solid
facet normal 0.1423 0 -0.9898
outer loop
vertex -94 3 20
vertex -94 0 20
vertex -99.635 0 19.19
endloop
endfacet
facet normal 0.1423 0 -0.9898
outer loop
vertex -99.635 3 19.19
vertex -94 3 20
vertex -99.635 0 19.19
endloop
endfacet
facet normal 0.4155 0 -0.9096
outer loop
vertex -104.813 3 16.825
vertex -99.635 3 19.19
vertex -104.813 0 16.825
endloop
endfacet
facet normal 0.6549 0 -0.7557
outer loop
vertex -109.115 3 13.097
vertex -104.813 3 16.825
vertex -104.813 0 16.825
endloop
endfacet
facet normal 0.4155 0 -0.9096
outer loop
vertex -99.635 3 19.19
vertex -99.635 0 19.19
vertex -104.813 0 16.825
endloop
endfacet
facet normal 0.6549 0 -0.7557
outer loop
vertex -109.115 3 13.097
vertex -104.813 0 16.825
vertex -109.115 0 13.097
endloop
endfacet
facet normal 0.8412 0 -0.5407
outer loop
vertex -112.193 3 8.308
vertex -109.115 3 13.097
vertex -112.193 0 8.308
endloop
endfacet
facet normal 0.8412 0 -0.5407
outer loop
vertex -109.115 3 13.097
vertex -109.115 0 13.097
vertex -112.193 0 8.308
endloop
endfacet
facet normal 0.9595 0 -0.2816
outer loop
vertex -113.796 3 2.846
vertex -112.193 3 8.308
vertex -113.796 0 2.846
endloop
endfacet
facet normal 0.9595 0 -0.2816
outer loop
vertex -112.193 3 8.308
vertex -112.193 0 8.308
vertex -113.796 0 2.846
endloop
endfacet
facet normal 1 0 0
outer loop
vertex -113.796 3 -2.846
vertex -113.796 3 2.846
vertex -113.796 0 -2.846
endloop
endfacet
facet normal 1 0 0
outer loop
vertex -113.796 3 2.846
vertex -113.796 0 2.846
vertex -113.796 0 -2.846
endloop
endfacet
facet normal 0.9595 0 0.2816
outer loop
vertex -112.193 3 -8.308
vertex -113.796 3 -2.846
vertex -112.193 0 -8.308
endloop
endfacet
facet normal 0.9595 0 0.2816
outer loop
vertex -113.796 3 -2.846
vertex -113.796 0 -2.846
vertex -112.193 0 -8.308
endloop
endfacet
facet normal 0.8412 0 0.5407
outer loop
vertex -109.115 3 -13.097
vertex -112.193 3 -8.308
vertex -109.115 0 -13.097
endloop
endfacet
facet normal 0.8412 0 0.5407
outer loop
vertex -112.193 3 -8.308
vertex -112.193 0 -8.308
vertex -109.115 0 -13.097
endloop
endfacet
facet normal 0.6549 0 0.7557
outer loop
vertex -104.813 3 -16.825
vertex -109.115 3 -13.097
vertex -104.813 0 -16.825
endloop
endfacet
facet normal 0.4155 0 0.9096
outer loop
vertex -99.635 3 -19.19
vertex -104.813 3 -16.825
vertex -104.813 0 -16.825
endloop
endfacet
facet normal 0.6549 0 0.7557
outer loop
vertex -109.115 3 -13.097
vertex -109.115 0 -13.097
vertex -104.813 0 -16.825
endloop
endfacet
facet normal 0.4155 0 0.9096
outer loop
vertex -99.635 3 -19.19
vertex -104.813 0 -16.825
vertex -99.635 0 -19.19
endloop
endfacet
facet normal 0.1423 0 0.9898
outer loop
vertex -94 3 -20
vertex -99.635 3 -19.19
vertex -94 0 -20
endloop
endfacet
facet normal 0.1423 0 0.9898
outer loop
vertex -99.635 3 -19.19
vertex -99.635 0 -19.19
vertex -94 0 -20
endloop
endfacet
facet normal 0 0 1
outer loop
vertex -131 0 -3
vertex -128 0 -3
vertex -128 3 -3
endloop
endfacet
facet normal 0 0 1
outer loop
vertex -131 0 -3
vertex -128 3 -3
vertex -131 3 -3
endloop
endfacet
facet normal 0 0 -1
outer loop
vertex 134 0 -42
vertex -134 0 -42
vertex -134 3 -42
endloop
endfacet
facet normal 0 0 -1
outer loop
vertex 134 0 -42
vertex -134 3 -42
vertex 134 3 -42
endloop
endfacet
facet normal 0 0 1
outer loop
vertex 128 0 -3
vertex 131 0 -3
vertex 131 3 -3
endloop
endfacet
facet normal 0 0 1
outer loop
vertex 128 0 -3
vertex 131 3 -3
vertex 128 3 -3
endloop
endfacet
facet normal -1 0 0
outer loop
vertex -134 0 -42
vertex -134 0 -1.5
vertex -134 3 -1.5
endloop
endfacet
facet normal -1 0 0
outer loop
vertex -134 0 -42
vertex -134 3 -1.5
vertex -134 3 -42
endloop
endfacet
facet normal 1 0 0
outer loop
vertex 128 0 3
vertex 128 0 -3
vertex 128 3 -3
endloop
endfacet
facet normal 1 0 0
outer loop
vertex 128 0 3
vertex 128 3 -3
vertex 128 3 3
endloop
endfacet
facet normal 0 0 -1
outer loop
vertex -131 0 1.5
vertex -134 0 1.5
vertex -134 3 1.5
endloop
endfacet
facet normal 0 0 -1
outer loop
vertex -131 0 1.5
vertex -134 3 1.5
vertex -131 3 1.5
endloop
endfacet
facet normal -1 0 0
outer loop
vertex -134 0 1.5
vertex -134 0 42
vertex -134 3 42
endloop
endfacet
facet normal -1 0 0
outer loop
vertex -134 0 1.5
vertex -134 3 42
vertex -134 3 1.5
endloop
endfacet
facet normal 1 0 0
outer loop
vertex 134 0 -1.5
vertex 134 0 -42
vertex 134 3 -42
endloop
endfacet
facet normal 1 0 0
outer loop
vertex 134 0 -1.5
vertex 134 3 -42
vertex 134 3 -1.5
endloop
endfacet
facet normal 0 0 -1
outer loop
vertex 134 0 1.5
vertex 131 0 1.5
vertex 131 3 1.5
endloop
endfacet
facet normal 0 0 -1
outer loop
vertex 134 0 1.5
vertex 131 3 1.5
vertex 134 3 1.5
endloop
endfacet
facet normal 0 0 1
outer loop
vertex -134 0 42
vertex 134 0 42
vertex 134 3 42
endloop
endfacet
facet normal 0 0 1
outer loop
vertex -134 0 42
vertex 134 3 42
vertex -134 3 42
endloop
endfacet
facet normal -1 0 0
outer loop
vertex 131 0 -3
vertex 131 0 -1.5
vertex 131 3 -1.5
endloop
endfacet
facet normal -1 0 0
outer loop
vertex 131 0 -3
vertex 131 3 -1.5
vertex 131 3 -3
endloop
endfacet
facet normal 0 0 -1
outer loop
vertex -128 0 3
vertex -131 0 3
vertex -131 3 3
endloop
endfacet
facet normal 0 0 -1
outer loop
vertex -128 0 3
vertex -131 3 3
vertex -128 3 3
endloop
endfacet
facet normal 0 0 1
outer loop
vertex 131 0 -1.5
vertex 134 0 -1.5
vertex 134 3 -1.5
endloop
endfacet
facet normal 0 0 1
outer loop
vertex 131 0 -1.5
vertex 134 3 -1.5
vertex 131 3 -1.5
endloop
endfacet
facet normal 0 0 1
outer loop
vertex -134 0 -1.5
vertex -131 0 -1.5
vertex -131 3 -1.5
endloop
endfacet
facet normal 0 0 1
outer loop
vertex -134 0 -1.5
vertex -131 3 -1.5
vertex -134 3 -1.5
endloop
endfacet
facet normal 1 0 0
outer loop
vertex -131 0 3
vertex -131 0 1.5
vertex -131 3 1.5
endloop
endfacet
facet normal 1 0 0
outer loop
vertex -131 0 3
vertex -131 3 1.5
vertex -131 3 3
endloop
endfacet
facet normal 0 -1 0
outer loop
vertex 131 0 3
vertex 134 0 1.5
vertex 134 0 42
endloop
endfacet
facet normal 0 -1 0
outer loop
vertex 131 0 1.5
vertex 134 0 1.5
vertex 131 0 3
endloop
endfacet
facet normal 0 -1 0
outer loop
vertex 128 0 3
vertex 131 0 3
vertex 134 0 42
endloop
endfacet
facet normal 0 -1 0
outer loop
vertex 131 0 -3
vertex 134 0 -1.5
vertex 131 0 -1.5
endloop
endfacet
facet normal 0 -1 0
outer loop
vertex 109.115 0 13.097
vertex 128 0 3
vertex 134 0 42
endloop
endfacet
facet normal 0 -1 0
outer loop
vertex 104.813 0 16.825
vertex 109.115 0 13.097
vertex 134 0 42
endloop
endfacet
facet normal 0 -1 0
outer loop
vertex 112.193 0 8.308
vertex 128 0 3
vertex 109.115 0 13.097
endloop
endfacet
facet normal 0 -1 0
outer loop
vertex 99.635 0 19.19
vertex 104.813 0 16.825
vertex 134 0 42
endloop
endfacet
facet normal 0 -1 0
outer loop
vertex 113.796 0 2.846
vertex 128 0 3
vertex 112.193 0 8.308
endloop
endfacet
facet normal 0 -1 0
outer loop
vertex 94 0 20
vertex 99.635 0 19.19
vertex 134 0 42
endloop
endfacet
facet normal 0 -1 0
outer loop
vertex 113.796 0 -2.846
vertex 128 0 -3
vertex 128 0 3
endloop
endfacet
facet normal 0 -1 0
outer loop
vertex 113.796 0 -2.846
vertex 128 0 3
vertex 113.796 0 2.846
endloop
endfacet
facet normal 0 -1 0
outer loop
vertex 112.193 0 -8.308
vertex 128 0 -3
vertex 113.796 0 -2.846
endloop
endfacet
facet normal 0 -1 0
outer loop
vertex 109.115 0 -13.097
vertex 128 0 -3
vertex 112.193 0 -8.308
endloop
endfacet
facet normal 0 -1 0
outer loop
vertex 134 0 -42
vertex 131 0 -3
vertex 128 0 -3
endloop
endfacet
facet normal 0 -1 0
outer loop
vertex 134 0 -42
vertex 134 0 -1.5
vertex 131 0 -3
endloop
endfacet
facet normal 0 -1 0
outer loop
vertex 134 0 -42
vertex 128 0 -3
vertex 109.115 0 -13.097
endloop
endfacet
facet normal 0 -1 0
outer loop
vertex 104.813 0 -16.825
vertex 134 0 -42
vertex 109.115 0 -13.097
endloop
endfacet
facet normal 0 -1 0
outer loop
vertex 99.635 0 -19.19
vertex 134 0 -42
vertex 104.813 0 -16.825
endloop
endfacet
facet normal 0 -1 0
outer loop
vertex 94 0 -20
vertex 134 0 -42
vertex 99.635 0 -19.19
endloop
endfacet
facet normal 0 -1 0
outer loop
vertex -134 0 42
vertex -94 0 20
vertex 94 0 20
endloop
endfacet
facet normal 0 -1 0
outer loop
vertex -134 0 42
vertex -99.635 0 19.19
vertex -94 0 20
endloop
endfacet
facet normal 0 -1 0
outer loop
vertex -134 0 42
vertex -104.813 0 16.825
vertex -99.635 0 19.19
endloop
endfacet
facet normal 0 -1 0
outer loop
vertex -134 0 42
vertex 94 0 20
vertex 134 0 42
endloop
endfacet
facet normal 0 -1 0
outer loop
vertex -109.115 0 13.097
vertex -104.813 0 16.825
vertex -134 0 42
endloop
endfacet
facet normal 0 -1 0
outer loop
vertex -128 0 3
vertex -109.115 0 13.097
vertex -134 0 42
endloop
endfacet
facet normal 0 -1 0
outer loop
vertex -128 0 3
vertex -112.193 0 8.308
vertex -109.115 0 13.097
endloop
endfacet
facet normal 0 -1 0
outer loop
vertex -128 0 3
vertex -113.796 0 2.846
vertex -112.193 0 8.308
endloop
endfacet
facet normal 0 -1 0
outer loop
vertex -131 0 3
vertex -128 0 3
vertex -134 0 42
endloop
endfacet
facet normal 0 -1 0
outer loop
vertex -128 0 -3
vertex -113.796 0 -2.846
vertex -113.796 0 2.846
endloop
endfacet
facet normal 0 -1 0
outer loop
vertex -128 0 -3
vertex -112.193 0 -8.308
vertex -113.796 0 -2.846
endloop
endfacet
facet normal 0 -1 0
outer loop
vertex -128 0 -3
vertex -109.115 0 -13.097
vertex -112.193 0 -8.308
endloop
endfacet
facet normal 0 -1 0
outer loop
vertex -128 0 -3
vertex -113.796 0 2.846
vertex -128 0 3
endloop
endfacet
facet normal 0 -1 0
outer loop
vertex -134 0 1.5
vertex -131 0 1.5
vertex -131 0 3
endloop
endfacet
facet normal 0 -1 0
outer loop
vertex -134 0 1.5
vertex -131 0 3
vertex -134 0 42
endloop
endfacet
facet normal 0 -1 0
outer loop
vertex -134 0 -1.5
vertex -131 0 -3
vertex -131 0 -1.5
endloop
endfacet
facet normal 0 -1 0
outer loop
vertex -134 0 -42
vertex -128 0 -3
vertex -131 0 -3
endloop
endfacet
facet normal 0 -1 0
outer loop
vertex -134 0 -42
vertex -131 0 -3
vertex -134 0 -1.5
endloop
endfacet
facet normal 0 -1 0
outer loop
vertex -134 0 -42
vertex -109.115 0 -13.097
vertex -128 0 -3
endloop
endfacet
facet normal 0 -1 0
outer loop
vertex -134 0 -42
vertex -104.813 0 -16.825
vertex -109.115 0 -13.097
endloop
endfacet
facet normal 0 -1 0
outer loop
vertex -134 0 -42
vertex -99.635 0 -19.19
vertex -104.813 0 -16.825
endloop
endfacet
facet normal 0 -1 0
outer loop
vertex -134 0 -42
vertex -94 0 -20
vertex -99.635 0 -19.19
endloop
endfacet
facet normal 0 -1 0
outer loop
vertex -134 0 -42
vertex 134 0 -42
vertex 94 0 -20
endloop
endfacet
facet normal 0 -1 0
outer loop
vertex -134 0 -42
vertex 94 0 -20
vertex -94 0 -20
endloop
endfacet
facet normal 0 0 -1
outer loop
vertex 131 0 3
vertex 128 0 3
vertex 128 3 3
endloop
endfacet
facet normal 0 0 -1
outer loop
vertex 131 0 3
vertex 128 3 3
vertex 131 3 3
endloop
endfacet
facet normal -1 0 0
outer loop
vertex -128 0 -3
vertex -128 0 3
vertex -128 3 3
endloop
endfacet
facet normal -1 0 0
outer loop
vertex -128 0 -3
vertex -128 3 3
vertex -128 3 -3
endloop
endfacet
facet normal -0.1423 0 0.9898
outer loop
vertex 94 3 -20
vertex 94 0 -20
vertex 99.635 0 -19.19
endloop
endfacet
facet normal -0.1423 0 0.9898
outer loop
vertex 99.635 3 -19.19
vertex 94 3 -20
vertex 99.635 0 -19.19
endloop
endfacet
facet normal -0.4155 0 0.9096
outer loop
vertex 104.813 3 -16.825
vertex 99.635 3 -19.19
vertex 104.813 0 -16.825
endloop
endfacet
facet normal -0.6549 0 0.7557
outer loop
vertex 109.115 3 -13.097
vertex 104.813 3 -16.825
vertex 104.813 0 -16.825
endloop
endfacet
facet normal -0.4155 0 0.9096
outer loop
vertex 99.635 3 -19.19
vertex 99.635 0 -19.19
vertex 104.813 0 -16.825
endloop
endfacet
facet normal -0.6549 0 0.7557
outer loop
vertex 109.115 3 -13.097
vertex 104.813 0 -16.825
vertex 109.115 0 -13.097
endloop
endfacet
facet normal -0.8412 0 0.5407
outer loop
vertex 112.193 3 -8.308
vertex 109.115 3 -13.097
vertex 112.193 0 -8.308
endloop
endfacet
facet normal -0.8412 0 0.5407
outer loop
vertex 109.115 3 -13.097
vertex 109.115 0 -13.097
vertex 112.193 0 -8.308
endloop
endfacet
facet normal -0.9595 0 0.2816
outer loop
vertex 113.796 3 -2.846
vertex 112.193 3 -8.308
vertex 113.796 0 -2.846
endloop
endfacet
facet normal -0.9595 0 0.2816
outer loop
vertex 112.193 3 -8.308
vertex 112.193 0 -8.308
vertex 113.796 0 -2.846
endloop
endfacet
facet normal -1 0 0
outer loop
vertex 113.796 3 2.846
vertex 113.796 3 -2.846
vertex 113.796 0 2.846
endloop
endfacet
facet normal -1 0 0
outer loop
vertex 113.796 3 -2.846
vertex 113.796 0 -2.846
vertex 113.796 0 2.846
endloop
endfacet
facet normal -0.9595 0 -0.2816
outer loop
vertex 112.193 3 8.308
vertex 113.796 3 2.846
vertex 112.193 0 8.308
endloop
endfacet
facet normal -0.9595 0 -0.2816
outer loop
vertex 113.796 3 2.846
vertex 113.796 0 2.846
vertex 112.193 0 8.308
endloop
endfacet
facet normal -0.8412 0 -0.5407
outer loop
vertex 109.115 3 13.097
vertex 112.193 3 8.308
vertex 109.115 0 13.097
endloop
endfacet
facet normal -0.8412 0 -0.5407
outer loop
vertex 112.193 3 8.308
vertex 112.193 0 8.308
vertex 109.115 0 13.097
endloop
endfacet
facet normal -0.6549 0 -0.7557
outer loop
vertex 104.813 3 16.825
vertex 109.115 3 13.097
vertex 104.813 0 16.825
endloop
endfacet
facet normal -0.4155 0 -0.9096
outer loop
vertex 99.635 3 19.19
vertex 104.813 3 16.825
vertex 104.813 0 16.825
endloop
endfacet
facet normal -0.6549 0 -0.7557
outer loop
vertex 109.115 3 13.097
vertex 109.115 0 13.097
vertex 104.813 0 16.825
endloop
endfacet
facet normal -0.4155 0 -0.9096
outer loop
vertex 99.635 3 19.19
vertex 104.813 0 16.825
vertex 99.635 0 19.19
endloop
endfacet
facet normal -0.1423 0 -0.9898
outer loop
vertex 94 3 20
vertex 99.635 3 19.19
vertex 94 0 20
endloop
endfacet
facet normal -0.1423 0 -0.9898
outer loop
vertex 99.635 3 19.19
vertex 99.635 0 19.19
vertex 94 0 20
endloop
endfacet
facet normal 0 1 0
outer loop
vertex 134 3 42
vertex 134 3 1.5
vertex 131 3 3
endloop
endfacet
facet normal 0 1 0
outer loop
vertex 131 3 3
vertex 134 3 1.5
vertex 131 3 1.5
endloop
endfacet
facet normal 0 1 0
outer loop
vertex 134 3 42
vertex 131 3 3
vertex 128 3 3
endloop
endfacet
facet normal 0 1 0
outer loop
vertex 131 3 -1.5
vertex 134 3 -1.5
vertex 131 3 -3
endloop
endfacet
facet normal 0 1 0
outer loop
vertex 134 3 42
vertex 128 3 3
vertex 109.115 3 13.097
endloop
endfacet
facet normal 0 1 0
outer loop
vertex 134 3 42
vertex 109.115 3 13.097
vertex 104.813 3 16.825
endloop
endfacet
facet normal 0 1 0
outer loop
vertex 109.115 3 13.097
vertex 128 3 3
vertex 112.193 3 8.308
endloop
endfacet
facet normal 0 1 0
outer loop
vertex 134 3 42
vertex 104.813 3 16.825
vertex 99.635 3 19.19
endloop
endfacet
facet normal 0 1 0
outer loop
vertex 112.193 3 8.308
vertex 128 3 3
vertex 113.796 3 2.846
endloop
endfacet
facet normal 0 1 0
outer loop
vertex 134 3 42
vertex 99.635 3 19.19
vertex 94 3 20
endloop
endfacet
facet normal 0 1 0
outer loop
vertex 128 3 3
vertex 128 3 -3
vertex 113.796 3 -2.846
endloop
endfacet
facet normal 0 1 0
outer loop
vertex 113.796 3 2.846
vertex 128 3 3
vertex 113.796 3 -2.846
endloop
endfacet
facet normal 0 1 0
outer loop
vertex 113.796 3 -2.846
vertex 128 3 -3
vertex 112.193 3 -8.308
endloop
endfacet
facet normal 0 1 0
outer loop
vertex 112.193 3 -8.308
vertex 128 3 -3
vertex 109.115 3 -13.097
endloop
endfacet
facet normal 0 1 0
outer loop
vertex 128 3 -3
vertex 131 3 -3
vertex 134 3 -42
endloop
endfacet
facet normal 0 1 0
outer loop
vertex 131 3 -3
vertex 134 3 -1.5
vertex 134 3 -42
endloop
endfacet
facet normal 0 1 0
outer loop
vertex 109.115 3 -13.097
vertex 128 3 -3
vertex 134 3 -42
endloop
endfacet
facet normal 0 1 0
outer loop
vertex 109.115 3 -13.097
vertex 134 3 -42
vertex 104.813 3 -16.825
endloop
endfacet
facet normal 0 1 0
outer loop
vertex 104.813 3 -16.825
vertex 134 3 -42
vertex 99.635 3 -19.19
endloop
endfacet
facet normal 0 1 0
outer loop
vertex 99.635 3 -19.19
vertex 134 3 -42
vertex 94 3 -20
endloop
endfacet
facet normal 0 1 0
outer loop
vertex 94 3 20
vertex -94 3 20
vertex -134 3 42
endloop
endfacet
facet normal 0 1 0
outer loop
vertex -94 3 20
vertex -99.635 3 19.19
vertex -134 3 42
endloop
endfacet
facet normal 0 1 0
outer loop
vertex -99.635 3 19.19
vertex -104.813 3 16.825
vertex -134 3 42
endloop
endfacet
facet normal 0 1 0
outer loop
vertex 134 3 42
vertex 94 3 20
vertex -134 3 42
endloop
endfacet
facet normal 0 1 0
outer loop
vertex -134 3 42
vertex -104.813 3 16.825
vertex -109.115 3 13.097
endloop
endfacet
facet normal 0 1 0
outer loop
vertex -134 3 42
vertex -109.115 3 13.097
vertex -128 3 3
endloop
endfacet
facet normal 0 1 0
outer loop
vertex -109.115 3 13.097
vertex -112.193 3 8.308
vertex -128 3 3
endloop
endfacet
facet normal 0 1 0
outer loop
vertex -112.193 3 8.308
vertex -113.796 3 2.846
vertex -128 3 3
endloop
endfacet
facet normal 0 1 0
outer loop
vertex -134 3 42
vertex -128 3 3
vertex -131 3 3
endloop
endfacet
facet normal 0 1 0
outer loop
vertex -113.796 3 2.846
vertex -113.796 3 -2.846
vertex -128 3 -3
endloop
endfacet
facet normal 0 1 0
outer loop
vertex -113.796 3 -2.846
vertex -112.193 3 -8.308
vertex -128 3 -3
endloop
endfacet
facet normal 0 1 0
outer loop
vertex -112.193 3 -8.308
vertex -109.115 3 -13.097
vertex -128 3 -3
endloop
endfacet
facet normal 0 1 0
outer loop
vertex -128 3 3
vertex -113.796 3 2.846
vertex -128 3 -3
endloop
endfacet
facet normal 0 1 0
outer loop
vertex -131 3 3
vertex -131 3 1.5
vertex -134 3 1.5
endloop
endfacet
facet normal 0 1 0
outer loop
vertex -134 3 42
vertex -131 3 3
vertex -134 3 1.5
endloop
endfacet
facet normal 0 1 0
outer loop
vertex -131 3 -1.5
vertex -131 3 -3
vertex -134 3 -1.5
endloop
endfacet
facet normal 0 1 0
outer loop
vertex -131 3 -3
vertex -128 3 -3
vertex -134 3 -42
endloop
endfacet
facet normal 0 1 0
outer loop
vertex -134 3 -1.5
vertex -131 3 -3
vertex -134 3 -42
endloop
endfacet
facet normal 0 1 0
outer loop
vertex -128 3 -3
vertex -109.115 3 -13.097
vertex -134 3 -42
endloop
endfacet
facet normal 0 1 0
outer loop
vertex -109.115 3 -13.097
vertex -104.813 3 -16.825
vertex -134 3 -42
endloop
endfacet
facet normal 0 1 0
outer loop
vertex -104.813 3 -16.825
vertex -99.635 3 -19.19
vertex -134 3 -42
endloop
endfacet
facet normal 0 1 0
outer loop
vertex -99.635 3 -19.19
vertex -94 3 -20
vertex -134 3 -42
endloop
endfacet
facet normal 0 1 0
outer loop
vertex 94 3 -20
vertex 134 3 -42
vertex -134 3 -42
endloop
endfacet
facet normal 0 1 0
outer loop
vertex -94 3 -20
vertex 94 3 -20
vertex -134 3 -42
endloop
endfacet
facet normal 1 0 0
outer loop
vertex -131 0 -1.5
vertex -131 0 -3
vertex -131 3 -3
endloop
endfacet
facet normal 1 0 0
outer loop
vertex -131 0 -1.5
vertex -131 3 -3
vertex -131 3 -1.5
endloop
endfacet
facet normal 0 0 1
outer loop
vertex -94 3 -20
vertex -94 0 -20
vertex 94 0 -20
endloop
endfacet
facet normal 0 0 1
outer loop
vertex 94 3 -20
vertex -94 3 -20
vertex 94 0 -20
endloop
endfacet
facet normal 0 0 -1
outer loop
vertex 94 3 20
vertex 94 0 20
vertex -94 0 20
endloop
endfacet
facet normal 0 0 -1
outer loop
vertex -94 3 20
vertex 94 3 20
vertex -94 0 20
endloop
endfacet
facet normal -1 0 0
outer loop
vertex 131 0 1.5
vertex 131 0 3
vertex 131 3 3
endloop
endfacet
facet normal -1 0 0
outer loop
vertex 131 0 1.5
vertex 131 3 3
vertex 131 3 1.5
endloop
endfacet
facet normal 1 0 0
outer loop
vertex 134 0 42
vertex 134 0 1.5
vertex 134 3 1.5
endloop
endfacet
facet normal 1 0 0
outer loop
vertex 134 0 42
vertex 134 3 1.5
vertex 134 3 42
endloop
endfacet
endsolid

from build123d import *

# Parameters (mm, degrees)
SALIENTE_EXTRUIR2_DEPTH = 3


with BuildPart() as part:
    # Croquis1 → Saliente-Extruir2 (new body)
    with BuildSketch(Plane(origin=(0, 0, 0), x_dir=(1, 0, 0), z_dir=(0, 1, 0))):
        Polygon((134, -42), (-134, -42), (-134, -1.5), (-131, -1.5), (-131, -3), (-128, -3), (-128, 3), (-131, 3), (-131, 1.5), (-134, 1.5), (-134, 42), (134, 42), (134, 1.5), (131, 1.5), (131, 3), (128, 3), (128, -3), (131, -3), (131, -1.5), (134, -1.5), align=None)
        with BuildLine():
            Line((94, -20), (-94, -20))
            ThreePointArc((-94, -20), (-114, 0), (-94, 20))
            Line((-94, 20), (94, 20))
            ThreePointArc((94, 20), (114, 0), (94, -20))
        make_face(mode=Mode.SUBTRACT)
    extrude(amount=SALIENTE_EXTRUIR2_DEPTH)


solid = part.part
